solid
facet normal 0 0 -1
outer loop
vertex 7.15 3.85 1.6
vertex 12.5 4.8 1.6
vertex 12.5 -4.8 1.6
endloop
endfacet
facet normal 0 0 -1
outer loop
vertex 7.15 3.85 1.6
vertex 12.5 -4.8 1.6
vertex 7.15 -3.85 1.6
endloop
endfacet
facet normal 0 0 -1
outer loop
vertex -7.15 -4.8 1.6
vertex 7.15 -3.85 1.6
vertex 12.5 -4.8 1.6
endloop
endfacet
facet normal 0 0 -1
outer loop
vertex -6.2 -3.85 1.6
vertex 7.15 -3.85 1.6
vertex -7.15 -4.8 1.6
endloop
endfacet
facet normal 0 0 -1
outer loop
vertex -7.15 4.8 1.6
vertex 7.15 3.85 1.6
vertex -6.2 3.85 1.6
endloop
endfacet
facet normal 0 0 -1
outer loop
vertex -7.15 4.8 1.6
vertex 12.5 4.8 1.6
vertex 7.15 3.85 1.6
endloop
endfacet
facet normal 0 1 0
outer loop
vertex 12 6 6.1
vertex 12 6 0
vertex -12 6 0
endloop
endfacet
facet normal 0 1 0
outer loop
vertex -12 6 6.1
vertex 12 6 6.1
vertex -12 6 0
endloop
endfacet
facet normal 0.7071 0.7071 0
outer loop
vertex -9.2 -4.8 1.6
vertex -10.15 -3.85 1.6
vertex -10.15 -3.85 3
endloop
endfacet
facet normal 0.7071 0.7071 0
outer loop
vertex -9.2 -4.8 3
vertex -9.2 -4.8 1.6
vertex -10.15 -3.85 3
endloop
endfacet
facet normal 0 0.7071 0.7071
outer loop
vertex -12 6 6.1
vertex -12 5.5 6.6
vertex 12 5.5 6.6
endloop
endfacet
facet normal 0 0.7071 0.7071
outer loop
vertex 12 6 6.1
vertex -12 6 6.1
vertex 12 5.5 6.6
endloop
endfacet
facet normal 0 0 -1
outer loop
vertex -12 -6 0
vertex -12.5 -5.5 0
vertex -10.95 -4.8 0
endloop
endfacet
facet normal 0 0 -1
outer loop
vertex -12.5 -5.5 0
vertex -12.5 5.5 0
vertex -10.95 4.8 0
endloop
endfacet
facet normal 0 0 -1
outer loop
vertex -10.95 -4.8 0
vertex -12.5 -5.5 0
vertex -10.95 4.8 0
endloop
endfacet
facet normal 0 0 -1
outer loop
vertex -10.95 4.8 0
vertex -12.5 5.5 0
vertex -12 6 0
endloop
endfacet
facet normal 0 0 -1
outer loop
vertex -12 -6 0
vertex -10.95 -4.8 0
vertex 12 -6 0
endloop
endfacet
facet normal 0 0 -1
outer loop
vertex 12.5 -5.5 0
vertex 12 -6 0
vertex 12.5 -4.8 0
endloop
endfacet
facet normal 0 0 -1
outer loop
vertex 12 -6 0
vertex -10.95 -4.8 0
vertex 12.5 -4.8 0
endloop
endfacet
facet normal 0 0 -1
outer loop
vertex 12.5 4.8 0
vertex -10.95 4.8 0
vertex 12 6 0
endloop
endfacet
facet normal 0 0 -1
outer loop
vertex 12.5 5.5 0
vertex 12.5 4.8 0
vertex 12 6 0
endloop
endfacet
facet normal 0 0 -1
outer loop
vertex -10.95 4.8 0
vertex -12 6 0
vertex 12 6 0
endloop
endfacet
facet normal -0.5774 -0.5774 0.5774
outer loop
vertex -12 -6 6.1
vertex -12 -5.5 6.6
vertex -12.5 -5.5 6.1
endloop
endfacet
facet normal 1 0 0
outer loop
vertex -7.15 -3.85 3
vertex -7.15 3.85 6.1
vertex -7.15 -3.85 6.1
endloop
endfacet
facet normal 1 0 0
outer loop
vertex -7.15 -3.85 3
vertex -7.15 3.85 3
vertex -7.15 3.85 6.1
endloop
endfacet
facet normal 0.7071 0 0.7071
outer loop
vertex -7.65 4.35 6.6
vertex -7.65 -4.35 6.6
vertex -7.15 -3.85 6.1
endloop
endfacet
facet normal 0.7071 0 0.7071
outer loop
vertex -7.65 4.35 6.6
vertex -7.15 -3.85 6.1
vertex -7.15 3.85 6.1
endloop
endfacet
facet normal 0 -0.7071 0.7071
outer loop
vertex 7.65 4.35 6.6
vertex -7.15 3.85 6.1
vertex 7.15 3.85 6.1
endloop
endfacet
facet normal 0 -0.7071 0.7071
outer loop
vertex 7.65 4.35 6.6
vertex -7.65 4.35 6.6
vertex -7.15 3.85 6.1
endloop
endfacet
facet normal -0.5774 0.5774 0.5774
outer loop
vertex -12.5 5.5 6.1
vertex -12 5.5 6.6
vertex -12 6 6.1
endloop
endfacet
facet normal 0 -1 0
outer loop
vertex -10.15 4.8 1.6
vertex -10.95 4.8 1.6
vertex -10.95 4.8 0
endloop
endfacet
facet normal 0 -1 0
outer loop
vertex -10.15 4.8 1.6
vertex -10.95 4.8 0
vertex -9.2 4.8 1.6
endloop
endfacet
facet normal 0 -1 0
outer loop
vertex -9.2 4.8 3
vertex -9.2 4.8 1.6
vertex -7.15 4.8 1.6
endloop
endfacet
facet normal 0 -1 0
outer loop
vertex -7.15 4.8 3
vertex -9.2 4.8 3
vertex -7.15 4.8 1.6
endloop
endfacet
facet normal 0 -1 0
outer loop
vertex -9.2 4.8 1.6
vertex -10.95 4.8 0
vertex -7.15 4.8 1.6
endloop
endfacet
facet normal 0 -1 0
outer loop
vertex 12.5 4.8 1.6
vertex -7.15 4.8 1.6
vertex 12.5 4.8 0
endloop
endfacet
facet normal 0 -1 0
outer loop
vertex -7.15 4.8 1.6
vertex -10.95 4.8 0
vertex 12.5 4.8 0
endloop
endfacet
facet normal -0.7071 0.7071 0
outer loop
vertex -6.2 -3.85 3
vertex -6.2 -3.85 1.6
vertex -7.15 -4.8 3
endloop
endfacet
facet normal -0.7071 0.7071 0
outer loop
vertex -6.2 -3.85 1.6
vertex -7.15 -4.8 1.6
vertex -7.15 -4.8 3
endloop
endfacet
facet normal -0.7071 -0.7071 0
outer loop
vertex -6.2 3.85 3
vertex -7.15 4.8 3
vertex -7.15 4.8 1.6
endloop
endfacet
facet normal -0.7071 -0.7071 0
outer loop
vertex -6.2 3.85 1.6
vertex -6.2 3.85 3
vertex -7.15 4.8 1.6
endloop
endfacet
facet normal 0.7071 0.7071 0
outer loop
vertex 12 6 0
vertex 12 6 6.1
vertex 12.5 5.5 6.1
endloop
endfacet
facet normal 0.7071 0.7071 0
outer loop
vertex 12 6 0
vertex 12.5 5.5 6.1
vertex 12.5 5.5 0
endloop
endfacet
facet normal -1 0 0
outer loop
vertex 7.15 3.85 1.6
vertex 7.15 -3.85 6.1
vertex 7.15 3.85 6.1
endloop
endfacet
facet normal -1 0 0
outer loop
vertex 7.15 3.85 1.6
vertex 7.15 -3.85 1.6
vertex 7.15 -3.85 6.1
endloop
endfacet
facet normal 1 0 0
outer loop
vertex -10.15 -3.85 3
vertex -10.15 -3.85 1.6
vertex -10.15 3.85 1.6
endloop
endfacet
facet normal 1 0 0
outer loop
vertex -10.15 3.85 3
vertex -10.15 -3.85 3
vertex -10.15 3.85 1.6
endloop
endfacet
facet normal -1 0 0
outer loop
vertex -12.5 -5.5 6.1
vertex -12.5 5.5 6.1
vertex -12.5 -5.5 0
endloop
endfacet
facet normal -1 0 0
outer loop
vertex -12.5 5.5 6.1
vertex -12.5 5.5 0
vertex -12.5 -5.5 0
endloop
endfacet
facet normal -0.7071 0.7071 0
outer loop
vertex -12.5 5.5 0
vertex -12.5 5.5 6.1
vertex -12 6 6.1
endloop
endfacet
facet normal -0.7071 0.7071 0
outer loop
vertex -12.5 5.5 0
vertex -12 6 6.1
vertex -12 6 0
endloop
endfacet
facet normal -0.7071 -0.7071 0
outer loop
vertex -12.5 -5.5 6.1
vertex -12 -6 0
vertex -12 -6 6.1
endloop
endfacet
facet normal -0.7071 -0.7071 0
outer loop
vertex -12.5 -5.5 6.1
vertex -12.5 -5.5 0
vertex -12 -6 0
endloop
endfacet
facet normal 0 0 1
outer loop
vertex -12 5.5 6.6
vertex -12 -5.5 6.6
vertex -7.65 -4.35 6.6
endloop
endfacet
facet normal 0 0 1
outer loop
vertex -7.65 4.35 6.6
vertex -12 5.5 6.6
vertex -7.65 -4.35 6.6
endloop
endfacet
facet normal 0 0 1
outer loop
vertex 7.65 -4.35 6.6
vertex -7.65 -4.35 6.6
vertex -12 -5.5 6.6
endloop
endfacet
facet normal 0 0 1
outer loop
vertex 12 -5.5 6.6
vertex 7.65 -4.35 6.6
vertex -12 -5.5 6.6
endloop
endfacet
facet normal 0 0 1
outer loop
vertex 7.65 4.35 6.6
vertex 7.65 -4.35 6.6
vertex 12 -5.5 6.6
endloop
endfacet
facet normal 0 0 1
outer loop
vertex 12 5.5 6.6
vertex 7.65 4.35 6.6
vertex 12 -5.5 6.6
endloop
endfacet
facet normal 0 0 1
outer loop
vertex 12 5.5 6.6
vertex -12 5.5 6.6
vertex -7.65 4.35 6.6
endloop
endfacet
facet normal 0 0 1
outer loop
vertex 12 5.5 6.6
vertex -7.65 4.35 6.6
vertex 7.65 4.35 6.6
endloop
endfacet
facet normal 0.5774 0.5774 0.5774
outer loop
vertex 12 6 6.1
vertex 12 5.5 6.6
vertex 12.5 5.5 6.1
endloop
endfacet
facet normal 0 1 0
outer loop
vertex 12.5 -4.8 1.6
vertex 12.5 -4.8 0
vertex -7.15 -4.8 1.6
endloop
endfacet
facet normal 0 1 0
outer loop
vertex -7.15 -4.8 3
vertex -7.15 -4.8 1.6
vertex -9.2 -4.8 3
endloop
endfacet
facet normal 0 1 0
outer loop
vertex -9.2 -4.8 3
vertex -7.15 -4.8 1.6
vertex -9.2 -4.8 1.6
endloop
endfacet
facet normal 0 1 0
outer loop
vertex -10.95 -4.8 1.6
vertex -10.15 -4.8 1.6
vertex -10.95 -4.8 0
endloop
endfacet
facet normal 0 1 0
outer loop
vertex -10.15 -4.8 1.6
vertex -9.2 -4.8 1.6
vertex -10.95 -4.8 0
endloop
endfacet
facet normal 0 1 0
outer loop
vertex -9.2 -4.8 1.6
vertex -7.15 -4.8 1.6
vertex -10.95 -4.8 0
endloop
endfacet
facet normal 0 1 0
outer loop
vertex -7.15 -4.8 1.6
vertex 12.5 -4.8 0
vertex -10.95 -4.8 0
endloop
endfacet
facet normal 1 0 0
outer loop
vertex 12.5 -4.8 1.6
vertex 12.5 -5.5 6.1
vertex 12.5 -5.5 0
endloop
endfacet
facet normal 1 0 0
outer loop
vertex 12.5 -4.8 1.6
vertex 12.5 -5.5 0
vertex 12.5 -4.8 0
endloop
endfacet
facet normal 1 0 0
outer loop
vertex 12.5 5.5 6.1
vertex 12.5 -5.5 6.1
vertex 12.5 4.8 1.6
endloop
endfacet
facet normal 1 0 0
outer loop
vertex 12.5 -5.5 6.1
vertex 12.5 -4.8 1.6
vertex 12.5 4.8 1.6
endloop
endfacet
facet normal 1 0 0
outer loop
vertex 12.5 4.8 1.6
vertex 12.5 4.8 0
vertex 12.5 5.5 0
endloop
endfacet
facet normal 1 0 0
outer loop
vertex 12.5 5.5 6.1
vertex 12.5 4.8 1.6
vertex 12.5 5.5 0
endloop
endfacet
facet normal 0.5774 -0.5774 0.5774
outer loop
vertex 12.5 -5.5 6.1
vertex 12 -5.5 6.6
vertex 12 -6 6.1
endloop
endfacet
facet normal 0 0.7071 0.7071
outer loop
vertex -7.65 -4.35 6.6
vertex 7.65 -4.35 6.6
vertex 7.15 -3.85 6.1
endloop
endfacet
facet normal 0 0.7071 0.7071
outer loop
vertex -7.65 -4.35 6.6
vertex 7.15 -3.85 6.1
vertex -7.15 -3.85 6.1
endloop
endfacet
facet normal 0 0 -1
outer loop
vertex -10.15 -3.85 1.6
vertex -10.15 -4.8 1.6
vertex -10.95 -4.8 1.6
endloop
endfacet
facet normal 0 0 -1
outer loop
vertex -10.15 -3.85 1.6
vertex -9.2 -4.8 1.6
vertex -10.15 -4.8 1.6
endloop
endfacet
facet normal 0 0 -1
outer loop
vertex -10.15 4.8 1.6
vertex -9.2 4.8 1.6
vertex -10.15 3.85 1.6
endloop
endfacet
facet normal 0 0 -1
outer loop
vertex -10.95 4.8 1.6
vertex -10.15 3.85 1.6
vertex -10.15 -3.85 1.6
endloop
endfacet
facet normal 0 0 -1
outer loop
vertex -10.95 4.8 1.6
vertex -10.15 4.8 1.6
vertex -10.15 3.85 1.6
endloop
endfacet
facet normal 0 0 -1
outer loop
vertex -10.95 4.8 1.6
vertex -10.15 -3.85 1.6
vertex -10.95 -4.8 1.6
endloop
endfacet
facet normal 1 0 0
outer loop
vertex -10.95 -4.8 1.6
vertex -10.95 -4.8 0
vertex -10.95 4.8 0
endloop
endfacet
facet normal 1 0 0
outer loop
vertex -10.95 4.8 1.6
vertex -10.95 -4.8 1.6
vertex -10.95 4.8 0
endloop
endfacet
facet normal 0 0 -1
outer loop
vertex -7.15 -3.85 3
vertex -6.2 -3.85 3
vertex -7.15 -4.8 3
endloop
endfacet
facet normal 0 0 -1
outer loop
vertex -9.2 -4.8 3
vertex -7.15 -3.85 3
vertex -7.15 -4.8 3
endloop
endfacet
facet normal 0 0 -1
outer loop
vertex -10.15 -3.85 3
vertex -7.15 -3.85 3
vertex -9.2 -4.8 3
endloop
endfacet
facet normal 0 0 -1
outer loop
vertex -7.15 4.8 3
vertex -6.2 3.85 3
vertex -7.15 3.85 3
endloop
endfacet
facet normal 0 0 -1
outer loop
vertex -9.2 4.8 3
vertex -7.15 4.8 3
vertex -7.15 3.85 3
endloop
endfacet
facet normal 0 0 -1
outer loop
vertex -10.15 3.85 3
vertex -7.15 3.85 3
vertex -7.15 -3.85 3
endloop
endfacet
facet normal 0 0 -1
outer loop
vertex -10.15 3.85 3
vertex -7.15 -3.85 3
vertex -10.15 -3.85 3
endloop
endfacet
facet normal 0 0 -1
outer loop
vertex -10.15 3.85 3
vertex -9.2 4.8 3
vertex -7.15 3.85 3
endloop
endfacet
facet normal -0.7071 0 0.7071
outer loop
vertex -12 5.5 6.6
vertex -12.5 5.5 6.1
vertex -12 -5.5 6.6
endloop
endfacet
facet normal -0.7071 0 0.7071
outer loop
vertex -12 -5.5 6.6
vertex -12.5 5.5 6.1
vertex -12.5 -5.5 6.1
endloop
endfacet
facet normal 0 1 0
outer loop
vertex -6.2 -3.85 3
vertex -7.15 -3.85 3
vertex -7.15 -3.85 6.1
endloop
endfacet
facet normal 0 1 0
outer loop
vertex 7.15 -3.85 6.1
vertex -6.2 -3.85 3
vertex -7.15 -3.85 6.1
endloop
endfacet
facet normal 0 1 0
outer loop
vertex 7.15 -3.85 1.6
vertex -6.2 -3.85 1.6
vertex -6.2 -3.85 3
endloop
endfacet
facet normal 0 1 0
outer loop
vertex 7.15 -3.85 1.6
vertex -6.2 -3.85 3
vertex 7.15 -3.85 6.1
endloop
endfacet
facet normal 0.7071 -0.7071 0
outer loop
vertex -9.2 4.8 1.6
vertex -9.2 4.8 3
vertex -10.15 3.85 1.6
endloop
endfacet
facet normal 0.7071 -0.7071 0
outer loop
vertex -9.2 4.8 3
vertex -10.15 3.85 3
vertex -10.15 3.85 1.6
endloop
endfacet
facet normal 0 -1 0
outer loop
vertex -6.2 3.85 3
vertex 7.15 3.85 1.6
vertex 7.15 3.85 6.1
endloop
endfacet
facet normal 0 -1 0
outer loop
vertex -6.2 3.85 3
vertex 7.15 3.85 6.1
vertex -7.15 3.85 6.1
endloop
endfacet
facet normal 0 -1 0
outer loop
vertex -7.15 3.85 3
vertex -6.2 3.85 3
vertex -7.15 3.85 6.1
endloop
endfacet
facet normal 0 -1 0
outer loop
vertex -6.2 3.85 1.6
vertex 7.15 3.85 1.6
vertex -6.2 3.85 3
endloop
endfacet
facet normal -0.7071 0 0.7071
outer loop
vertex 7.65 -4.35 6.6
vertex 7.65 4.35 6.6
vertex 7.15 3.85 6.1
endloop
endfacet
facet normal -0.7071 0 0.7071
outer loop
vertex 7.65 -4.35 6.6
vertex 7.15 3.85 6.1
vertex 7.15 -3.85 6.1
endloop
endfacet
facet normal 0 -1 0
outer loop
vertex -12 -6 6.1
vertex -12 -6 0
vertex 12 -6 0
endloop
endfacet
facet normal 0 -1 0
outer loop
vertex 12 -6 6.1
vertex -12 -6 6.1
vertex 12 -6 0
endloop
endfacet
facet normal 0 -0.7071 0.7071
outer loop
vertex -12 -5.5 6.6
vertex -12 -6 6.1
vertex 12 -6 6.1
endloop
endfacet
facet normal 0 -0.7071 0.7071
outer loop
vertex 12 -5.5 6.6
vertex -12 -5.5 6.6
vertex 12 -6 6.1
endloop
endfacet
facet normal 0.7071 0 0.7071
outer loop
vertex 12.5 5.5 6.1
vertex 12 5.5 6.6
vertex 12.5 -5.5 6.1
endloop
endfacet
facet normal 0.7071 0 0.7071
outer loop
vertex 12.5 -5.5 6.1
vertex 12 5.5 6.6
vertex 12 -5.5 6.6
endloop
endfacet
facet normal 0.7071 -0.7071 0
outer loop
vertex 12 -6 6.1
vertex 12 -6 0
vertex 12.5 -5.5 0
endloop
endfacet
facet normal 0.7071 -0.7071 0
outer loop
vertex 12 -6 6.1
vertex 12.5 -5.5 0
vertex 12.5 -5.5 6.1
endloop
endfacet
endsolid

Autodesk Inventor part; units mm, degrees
ref_plane "YZ Plane" through (0, 0, 0) normal (1, 0, 0) x (0, 1, 0)
ref_plane "XZ Plane" through (0, 0, 0) normal (0, 1, 0) x (-1, 0, 0)
ref_plane "XY Plane" through (0, 0, 0) normal (0, 0, 1) x (1, 0, 0)
sketch "Sketch1" plane through (0, 0, 0) normal (0, 0, 1) x (1, 0, 0)
  line L0 (-7.15, -3.85) -> (7.15, -3.85)
  line L1 (7.15, -3.85) -> (7.15, 3.85)
  line L2 (7.15, 3.85) -> (-7.15, 3.85)
  line L3 (-7.15, 3.85) -> (-7.15, -3.85)
  line L4 (-7.15, -3.85) -> (7.15, 3.85) construction
  line L5 (7.15, -3.85) -> (-7.15, 3.85) construction
  line L6 (-12.5, -6) -> (12.5, -6)
  line L7 (12.5, -6) -> (12.5, 6)
  line L8 (12.5, 6) -> (-12.5, 6)
  line L9 (-12.5, 6) -> (-12.5, -6)
  line L10 (-12.5, -6) -> (12.5, 6) construction
  line L11 (12.5, -6) -> (-12.5, 6) construction
  point P0 (0, 0)
  dimension "d0" = 7.7
  dimension "d1" = 14.3
  dimension "d3" = 12
  dimension "d4" = 25
extrude "Extrusion1" add sketch "Sketch1" along normal blind 6.6
sketch "Sketch2" plane through (0, 0, 0) normal (0, 0, -1) x (-1, 0, 0)
  line L0 (10.15, 4.8) -> (7.15, 4.8)
  line L1 (7.15, 4.8) -> (7.15, -4.8)
  line L2 (7.15, -4.8) -> (10.15, -4.8)
  line L3 (10.15, -4.8) -> (10.15, 4.8)
  line L4 (7.15, 3.85) -> (-7.15, 3.85) projected
  line L5 (-7.15, -3.85) -> (7.15, -3.85) projected
  point P0 (0, 0)
  dimension "d8" = 3
  dimension "d18" = 9.6
  dimension "d19" = 0.95
extrude "Extrusion2" cut sketch "Sketch2" against normal blind 3
sketch "Sketch3" plane through (0, 0, 0) normal (0, 0, -1) x (-1, 0, 0)
  line L0 (17.5, 0) -> (-17.5, 0) projected
  line L1 (-12.65, -4.8) -> (10.95, -4.8)
  line L2 (10.95, -4.8) -> (10.95, 4.8)
  line L3 (10.95, 4.8) -> (-12.65, 4.8)
  line L4 (-12.65, 4.8) -> (-12.65, -4.8)
  line L5 (-12.65, -4.8) -> (10.95, 4.8) construction
  line L6 (10.95, -4.8) -> (-12.65, 4.8) construction
  line L7 (-7.15, 3.85) -> (-7.15, -3.85) projected
  line L8 (7.15, -3.85) -> (7.15, 3.85) projected
  line L9 (10.15, 4.8) -> (10.15, -4.8) projected
  point P0 (0, 0)
  point P1 (-0.85, 0)
  dimension "d13" = 5.5
  dimension "d14" = 3.8
  dimension "d15" = 9.6
extrude "Extrusion3" cut sketch "Sketch3" against normal blind 1.6
chamfer "Chamfer1" distance 0.95 angle 45 4 edges at (-7.15, 3.85, 2.3) (-7.15, -3.85, 2.3) (-10.15, -4.8, 2.3) (-10.15, 4.8, 2.3)
chamfer "Chamfer2" distance 0.5 angle 45 12 edges at (0, 3.85, 6.6) (-7.15, 0, 6.6) (0, 6, 6.6) (-12.5, 0, 6.6) (0, -6, 6.6) (12.5, 0, 6.6) (7.15, 0, 6.6) (0, -3.85, 6.6) (-12.5, 6, 3.3) (12.5, 6, 3.3) (12.5, -6, 3.3) (-12.5, -6, 3.3)
